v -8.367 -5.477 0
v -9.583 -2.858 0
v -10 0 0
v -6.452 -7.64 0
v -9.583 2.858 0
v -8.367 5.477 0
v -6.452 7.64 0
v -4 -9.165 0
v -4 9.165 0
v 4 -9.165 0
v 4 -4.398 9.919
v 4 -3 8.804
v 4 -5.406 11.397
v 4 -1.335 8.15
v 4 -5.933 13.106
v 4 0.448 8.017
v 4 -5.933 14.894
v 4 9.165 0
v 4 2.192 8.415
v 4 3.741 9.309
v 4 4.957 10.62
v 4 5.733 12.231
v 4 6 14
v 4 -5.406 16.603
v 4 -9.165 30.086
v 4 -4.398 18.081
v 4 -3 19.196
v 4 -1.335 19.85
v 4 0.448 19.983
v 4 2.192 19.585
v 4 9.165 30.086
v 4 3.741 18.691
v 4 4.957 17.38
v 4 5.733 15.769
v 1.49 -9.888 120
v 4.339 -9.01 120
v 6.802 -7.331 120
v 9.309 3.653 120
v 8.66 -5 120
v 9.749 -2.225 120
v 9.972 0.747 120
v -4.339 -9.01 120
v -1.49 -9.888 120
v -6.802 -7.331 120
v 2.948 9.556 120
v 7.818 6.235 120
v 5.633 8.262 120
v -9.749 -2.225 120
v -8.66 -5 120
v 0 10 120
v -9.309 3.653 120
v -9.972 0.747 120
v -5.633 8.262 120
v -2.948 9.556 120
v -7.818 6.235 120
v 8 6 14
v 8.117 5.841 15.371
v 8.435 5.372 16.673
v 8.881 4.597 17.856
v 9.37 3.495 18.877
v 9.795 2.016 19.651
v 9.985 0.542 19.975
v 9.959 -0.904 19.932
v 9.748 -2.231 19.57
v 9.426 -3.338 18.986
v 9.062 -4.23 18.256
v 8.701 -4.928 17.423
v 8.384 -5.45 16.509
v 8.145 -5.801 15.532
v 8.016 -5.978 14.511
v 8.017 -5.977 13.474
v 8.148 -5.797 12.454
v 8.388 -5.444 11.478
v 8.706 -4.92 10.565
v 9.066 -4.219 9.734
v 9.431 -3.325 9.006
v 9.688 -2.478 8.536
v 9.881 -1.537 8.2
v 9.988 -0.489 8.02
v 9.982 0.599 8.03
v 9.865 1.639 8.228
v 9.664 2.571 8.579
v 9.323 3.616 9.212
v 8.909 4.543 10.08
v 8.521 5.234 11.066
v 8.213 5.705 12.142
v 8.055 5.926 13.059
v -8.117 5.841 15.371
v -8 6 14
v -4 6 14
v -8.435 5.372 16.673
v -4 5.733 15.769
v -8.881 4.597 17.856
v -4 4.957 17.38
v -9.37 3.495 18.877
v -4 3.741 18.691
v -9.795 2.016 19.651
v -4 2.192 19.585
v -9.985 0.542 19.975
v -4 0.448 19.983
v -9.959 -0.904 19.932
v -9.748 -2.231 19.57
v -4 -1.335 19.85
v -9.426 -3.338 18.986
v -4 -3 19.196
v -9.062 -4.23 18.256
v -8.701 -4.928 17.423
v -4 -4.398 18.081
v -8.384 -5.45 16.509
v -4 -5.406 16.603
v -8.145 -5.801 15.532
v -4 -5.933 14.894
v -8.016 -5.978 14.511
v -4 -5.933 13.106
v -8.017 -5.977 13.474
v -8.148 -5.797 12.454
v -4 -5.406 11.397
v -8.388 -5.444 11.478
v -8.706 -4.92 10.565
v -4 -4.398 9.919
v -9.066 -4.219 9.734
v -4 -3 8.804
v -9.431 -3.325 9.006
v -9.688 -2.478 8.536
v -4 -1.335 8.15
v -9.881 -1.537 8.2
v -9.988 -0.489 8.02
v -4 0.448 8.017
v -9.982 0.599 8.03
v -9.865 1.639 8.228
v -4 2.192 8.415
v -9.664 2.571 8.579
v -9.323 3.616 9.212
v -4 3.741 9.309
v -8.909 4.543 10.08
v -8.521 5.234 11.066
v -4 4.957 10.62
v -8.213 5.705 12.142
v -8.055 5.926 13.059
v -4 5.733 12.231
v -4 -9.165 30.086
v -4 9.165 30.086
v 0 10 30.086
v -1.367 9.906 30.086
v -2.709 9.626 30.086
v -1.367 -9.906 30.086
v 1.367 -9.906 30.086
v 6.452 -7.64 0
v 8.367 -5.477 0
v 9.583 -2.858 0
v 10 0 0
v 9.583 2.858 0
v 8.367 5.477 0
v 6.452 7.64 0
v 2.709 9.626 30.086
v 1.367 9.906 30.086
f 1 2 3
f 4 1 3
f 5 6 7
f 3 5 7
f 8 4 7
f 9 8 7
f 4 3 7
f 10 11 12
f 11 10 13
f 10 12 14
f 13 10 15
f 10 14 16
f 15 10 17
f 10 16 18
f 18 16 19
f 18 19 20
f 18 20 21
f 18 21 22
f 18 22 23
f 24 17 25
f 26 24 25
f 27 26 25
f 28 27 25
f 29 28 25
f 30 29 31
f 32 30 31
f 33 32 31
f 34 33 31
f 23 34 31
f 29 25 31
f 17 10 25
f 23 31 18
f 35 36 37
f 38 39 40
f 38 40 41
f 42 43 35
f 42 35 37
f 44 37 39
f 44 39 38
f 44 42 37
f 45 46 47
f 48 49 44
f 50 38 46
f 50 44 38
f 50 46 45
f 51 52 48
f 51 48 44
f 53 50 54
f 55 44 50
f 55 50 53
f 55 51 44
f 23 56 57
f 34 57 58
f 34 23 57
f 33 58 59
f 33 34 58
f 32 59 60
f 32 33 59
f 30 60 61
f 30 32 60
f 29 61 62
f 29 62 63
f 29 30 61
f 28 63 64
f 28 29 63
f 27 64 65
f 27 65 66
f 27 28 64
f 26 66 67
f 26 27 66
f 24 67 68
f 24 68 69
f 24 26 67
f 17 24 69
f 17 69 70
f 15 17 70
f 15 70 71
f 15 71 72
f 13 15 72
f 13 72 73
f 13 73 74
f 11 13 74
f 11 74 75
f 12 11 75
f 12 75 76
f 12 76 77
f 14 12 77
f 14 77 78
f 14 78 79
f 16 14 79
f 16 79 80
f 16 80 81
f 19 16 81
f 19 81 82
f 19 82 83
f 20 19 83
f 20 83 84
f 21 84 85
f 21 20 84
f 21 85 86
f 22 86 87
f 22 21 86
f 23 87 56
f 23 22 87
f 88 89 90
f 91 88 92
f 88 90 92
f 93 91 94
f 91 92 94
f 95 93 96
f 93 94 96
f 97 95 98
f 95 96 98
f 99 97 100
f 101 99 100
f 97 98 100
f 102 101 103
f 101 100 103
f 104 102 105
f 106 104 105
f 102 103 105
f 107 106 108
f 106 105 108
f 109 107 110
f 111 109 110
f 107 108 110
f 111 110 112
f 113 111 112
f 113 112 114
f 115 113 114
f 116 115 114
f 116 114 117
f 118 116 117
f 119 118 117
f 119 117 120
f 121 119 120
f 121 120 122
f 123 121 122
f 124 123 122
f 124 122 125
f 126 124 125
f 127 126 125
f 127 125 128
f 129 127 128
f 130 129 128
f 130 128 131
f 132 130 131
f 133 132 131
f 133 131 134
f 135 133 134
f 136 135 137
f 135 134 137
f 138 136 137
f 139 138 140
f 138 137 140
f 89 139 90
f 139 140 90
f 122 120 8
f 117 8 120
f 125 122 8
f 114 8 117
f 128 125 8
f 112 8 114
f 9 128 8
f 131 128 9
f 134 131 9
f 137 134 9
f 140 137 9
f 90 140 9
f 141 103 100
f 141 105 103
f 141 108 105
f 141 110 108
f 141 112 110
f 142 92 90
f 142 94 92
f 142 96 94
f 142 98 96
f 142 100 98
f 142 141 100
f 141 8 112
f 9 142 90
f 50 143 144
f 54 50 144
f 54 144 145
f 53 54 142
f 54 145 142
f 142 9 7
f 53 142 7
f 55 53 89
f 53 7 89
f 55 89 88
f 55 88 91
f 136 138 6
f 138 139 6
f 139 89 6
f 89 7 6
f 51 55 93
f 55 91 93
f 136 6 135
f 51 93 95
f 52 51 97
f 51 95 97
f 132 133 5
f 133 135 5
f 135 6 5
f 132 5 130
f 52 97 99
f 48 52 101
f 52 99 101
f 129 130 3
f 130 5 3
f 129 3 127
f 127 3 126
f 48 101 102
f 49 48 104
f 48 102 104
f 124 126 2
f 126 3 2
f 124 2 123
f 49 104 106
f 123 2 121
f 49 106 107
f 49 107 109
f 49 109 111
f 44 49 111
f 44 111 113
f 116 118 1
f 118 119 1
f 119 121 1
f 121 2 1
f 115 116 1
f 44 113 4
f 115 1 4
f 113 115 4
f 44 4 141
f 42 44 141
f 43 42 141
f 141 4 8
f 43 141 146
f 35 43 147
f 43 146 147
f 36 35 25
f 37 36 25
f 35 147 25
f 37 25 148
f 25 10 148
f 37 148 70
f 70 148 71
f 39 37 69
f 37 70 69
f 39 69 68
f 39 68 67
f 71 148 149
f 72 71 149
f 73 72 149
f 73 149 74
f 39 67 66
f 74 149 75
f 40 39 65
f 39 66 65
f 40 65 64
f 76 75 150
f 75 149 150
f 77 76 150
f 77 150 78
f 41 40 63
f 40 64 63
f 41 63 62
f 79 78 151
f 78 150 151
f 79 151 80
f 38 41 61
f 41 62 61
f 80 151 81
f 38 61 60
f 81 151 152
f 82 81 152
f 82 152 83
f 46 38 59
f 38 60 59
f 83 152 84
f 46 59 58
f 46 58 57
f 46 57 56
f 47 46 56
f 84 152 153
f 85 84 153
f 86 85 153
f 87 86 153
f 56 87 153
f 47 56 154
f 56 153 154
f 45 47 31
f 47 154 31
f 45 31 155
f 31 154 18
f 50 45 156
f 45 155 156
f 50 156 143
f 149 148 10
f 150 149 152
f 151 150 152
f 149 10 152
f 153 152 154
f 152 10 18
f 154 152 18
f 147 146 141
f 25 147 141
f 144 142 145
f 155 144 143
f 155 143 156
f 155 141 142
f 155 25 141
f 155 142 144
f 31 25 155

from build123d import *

# Parameters (mm, degrees)
SKETCH1_R               = 10
BOSS_EXTRUDE1_DEPTH     = 120
CUT_EXTRUDE3_DEPTH      = 40
CUT_EXTRUDE3_DEPTH_BACK = 40
SKETCH4_R               = 6
CUT_EXTRUDE4_DEPTH      = 4
CUT_EXTRUDE4_DEPTH_BACK = 4
SKETCH5_W               = 23.593926408
SKETCH5_H               = 33.705609154


with BuildPart() as part:
    # Sketch1 → Boss-Extrude1 (new body)
    with BuildSketch(Plane(origin=(0, 0, 0), x_dir=(0, 1, 0), z_dir=(0, 0, 1))):
        Circle(SKETCH1_R)
    extrude(amount=BOSS_EXTRUDE1_DEPTH)

    # Sketch4 → Cut-Extrude3 (cut, two sides: drawn at the far end of the back side and taken through both)
    with BuildSketch(Plane.YZ.offset(-CUT_EXTRUDE3_DEPTH_BACK)):
        with Locations((0, 14)):
            Circle(SKETCH4_R)
    extrude(amount=CUT_EXTRUDE3_DEPTH + CUT_EXTRUDE3_DEPTH_BACK, mode=Mode.SUBTRACT)

    # Sketch5 → Cut-Extrude4 (cut, two sides: drawn at the far end of the back side and taken through both)
    with BuildSketch(Plane.YZ.offset(-CUT_EXTRUDE4_DEPTH_BACK)):
        with Locations((0.674112183, 13.2334673)):
            Rectangle(SKETCH5_W, SKETCH5_H)
    extrude(amount=CUT_EXTRUDE4_DEPTH + CUT_EXTRUDE4_DEPTH_BACK, mode=Mode.SUBTRACT)


solid = part.part
